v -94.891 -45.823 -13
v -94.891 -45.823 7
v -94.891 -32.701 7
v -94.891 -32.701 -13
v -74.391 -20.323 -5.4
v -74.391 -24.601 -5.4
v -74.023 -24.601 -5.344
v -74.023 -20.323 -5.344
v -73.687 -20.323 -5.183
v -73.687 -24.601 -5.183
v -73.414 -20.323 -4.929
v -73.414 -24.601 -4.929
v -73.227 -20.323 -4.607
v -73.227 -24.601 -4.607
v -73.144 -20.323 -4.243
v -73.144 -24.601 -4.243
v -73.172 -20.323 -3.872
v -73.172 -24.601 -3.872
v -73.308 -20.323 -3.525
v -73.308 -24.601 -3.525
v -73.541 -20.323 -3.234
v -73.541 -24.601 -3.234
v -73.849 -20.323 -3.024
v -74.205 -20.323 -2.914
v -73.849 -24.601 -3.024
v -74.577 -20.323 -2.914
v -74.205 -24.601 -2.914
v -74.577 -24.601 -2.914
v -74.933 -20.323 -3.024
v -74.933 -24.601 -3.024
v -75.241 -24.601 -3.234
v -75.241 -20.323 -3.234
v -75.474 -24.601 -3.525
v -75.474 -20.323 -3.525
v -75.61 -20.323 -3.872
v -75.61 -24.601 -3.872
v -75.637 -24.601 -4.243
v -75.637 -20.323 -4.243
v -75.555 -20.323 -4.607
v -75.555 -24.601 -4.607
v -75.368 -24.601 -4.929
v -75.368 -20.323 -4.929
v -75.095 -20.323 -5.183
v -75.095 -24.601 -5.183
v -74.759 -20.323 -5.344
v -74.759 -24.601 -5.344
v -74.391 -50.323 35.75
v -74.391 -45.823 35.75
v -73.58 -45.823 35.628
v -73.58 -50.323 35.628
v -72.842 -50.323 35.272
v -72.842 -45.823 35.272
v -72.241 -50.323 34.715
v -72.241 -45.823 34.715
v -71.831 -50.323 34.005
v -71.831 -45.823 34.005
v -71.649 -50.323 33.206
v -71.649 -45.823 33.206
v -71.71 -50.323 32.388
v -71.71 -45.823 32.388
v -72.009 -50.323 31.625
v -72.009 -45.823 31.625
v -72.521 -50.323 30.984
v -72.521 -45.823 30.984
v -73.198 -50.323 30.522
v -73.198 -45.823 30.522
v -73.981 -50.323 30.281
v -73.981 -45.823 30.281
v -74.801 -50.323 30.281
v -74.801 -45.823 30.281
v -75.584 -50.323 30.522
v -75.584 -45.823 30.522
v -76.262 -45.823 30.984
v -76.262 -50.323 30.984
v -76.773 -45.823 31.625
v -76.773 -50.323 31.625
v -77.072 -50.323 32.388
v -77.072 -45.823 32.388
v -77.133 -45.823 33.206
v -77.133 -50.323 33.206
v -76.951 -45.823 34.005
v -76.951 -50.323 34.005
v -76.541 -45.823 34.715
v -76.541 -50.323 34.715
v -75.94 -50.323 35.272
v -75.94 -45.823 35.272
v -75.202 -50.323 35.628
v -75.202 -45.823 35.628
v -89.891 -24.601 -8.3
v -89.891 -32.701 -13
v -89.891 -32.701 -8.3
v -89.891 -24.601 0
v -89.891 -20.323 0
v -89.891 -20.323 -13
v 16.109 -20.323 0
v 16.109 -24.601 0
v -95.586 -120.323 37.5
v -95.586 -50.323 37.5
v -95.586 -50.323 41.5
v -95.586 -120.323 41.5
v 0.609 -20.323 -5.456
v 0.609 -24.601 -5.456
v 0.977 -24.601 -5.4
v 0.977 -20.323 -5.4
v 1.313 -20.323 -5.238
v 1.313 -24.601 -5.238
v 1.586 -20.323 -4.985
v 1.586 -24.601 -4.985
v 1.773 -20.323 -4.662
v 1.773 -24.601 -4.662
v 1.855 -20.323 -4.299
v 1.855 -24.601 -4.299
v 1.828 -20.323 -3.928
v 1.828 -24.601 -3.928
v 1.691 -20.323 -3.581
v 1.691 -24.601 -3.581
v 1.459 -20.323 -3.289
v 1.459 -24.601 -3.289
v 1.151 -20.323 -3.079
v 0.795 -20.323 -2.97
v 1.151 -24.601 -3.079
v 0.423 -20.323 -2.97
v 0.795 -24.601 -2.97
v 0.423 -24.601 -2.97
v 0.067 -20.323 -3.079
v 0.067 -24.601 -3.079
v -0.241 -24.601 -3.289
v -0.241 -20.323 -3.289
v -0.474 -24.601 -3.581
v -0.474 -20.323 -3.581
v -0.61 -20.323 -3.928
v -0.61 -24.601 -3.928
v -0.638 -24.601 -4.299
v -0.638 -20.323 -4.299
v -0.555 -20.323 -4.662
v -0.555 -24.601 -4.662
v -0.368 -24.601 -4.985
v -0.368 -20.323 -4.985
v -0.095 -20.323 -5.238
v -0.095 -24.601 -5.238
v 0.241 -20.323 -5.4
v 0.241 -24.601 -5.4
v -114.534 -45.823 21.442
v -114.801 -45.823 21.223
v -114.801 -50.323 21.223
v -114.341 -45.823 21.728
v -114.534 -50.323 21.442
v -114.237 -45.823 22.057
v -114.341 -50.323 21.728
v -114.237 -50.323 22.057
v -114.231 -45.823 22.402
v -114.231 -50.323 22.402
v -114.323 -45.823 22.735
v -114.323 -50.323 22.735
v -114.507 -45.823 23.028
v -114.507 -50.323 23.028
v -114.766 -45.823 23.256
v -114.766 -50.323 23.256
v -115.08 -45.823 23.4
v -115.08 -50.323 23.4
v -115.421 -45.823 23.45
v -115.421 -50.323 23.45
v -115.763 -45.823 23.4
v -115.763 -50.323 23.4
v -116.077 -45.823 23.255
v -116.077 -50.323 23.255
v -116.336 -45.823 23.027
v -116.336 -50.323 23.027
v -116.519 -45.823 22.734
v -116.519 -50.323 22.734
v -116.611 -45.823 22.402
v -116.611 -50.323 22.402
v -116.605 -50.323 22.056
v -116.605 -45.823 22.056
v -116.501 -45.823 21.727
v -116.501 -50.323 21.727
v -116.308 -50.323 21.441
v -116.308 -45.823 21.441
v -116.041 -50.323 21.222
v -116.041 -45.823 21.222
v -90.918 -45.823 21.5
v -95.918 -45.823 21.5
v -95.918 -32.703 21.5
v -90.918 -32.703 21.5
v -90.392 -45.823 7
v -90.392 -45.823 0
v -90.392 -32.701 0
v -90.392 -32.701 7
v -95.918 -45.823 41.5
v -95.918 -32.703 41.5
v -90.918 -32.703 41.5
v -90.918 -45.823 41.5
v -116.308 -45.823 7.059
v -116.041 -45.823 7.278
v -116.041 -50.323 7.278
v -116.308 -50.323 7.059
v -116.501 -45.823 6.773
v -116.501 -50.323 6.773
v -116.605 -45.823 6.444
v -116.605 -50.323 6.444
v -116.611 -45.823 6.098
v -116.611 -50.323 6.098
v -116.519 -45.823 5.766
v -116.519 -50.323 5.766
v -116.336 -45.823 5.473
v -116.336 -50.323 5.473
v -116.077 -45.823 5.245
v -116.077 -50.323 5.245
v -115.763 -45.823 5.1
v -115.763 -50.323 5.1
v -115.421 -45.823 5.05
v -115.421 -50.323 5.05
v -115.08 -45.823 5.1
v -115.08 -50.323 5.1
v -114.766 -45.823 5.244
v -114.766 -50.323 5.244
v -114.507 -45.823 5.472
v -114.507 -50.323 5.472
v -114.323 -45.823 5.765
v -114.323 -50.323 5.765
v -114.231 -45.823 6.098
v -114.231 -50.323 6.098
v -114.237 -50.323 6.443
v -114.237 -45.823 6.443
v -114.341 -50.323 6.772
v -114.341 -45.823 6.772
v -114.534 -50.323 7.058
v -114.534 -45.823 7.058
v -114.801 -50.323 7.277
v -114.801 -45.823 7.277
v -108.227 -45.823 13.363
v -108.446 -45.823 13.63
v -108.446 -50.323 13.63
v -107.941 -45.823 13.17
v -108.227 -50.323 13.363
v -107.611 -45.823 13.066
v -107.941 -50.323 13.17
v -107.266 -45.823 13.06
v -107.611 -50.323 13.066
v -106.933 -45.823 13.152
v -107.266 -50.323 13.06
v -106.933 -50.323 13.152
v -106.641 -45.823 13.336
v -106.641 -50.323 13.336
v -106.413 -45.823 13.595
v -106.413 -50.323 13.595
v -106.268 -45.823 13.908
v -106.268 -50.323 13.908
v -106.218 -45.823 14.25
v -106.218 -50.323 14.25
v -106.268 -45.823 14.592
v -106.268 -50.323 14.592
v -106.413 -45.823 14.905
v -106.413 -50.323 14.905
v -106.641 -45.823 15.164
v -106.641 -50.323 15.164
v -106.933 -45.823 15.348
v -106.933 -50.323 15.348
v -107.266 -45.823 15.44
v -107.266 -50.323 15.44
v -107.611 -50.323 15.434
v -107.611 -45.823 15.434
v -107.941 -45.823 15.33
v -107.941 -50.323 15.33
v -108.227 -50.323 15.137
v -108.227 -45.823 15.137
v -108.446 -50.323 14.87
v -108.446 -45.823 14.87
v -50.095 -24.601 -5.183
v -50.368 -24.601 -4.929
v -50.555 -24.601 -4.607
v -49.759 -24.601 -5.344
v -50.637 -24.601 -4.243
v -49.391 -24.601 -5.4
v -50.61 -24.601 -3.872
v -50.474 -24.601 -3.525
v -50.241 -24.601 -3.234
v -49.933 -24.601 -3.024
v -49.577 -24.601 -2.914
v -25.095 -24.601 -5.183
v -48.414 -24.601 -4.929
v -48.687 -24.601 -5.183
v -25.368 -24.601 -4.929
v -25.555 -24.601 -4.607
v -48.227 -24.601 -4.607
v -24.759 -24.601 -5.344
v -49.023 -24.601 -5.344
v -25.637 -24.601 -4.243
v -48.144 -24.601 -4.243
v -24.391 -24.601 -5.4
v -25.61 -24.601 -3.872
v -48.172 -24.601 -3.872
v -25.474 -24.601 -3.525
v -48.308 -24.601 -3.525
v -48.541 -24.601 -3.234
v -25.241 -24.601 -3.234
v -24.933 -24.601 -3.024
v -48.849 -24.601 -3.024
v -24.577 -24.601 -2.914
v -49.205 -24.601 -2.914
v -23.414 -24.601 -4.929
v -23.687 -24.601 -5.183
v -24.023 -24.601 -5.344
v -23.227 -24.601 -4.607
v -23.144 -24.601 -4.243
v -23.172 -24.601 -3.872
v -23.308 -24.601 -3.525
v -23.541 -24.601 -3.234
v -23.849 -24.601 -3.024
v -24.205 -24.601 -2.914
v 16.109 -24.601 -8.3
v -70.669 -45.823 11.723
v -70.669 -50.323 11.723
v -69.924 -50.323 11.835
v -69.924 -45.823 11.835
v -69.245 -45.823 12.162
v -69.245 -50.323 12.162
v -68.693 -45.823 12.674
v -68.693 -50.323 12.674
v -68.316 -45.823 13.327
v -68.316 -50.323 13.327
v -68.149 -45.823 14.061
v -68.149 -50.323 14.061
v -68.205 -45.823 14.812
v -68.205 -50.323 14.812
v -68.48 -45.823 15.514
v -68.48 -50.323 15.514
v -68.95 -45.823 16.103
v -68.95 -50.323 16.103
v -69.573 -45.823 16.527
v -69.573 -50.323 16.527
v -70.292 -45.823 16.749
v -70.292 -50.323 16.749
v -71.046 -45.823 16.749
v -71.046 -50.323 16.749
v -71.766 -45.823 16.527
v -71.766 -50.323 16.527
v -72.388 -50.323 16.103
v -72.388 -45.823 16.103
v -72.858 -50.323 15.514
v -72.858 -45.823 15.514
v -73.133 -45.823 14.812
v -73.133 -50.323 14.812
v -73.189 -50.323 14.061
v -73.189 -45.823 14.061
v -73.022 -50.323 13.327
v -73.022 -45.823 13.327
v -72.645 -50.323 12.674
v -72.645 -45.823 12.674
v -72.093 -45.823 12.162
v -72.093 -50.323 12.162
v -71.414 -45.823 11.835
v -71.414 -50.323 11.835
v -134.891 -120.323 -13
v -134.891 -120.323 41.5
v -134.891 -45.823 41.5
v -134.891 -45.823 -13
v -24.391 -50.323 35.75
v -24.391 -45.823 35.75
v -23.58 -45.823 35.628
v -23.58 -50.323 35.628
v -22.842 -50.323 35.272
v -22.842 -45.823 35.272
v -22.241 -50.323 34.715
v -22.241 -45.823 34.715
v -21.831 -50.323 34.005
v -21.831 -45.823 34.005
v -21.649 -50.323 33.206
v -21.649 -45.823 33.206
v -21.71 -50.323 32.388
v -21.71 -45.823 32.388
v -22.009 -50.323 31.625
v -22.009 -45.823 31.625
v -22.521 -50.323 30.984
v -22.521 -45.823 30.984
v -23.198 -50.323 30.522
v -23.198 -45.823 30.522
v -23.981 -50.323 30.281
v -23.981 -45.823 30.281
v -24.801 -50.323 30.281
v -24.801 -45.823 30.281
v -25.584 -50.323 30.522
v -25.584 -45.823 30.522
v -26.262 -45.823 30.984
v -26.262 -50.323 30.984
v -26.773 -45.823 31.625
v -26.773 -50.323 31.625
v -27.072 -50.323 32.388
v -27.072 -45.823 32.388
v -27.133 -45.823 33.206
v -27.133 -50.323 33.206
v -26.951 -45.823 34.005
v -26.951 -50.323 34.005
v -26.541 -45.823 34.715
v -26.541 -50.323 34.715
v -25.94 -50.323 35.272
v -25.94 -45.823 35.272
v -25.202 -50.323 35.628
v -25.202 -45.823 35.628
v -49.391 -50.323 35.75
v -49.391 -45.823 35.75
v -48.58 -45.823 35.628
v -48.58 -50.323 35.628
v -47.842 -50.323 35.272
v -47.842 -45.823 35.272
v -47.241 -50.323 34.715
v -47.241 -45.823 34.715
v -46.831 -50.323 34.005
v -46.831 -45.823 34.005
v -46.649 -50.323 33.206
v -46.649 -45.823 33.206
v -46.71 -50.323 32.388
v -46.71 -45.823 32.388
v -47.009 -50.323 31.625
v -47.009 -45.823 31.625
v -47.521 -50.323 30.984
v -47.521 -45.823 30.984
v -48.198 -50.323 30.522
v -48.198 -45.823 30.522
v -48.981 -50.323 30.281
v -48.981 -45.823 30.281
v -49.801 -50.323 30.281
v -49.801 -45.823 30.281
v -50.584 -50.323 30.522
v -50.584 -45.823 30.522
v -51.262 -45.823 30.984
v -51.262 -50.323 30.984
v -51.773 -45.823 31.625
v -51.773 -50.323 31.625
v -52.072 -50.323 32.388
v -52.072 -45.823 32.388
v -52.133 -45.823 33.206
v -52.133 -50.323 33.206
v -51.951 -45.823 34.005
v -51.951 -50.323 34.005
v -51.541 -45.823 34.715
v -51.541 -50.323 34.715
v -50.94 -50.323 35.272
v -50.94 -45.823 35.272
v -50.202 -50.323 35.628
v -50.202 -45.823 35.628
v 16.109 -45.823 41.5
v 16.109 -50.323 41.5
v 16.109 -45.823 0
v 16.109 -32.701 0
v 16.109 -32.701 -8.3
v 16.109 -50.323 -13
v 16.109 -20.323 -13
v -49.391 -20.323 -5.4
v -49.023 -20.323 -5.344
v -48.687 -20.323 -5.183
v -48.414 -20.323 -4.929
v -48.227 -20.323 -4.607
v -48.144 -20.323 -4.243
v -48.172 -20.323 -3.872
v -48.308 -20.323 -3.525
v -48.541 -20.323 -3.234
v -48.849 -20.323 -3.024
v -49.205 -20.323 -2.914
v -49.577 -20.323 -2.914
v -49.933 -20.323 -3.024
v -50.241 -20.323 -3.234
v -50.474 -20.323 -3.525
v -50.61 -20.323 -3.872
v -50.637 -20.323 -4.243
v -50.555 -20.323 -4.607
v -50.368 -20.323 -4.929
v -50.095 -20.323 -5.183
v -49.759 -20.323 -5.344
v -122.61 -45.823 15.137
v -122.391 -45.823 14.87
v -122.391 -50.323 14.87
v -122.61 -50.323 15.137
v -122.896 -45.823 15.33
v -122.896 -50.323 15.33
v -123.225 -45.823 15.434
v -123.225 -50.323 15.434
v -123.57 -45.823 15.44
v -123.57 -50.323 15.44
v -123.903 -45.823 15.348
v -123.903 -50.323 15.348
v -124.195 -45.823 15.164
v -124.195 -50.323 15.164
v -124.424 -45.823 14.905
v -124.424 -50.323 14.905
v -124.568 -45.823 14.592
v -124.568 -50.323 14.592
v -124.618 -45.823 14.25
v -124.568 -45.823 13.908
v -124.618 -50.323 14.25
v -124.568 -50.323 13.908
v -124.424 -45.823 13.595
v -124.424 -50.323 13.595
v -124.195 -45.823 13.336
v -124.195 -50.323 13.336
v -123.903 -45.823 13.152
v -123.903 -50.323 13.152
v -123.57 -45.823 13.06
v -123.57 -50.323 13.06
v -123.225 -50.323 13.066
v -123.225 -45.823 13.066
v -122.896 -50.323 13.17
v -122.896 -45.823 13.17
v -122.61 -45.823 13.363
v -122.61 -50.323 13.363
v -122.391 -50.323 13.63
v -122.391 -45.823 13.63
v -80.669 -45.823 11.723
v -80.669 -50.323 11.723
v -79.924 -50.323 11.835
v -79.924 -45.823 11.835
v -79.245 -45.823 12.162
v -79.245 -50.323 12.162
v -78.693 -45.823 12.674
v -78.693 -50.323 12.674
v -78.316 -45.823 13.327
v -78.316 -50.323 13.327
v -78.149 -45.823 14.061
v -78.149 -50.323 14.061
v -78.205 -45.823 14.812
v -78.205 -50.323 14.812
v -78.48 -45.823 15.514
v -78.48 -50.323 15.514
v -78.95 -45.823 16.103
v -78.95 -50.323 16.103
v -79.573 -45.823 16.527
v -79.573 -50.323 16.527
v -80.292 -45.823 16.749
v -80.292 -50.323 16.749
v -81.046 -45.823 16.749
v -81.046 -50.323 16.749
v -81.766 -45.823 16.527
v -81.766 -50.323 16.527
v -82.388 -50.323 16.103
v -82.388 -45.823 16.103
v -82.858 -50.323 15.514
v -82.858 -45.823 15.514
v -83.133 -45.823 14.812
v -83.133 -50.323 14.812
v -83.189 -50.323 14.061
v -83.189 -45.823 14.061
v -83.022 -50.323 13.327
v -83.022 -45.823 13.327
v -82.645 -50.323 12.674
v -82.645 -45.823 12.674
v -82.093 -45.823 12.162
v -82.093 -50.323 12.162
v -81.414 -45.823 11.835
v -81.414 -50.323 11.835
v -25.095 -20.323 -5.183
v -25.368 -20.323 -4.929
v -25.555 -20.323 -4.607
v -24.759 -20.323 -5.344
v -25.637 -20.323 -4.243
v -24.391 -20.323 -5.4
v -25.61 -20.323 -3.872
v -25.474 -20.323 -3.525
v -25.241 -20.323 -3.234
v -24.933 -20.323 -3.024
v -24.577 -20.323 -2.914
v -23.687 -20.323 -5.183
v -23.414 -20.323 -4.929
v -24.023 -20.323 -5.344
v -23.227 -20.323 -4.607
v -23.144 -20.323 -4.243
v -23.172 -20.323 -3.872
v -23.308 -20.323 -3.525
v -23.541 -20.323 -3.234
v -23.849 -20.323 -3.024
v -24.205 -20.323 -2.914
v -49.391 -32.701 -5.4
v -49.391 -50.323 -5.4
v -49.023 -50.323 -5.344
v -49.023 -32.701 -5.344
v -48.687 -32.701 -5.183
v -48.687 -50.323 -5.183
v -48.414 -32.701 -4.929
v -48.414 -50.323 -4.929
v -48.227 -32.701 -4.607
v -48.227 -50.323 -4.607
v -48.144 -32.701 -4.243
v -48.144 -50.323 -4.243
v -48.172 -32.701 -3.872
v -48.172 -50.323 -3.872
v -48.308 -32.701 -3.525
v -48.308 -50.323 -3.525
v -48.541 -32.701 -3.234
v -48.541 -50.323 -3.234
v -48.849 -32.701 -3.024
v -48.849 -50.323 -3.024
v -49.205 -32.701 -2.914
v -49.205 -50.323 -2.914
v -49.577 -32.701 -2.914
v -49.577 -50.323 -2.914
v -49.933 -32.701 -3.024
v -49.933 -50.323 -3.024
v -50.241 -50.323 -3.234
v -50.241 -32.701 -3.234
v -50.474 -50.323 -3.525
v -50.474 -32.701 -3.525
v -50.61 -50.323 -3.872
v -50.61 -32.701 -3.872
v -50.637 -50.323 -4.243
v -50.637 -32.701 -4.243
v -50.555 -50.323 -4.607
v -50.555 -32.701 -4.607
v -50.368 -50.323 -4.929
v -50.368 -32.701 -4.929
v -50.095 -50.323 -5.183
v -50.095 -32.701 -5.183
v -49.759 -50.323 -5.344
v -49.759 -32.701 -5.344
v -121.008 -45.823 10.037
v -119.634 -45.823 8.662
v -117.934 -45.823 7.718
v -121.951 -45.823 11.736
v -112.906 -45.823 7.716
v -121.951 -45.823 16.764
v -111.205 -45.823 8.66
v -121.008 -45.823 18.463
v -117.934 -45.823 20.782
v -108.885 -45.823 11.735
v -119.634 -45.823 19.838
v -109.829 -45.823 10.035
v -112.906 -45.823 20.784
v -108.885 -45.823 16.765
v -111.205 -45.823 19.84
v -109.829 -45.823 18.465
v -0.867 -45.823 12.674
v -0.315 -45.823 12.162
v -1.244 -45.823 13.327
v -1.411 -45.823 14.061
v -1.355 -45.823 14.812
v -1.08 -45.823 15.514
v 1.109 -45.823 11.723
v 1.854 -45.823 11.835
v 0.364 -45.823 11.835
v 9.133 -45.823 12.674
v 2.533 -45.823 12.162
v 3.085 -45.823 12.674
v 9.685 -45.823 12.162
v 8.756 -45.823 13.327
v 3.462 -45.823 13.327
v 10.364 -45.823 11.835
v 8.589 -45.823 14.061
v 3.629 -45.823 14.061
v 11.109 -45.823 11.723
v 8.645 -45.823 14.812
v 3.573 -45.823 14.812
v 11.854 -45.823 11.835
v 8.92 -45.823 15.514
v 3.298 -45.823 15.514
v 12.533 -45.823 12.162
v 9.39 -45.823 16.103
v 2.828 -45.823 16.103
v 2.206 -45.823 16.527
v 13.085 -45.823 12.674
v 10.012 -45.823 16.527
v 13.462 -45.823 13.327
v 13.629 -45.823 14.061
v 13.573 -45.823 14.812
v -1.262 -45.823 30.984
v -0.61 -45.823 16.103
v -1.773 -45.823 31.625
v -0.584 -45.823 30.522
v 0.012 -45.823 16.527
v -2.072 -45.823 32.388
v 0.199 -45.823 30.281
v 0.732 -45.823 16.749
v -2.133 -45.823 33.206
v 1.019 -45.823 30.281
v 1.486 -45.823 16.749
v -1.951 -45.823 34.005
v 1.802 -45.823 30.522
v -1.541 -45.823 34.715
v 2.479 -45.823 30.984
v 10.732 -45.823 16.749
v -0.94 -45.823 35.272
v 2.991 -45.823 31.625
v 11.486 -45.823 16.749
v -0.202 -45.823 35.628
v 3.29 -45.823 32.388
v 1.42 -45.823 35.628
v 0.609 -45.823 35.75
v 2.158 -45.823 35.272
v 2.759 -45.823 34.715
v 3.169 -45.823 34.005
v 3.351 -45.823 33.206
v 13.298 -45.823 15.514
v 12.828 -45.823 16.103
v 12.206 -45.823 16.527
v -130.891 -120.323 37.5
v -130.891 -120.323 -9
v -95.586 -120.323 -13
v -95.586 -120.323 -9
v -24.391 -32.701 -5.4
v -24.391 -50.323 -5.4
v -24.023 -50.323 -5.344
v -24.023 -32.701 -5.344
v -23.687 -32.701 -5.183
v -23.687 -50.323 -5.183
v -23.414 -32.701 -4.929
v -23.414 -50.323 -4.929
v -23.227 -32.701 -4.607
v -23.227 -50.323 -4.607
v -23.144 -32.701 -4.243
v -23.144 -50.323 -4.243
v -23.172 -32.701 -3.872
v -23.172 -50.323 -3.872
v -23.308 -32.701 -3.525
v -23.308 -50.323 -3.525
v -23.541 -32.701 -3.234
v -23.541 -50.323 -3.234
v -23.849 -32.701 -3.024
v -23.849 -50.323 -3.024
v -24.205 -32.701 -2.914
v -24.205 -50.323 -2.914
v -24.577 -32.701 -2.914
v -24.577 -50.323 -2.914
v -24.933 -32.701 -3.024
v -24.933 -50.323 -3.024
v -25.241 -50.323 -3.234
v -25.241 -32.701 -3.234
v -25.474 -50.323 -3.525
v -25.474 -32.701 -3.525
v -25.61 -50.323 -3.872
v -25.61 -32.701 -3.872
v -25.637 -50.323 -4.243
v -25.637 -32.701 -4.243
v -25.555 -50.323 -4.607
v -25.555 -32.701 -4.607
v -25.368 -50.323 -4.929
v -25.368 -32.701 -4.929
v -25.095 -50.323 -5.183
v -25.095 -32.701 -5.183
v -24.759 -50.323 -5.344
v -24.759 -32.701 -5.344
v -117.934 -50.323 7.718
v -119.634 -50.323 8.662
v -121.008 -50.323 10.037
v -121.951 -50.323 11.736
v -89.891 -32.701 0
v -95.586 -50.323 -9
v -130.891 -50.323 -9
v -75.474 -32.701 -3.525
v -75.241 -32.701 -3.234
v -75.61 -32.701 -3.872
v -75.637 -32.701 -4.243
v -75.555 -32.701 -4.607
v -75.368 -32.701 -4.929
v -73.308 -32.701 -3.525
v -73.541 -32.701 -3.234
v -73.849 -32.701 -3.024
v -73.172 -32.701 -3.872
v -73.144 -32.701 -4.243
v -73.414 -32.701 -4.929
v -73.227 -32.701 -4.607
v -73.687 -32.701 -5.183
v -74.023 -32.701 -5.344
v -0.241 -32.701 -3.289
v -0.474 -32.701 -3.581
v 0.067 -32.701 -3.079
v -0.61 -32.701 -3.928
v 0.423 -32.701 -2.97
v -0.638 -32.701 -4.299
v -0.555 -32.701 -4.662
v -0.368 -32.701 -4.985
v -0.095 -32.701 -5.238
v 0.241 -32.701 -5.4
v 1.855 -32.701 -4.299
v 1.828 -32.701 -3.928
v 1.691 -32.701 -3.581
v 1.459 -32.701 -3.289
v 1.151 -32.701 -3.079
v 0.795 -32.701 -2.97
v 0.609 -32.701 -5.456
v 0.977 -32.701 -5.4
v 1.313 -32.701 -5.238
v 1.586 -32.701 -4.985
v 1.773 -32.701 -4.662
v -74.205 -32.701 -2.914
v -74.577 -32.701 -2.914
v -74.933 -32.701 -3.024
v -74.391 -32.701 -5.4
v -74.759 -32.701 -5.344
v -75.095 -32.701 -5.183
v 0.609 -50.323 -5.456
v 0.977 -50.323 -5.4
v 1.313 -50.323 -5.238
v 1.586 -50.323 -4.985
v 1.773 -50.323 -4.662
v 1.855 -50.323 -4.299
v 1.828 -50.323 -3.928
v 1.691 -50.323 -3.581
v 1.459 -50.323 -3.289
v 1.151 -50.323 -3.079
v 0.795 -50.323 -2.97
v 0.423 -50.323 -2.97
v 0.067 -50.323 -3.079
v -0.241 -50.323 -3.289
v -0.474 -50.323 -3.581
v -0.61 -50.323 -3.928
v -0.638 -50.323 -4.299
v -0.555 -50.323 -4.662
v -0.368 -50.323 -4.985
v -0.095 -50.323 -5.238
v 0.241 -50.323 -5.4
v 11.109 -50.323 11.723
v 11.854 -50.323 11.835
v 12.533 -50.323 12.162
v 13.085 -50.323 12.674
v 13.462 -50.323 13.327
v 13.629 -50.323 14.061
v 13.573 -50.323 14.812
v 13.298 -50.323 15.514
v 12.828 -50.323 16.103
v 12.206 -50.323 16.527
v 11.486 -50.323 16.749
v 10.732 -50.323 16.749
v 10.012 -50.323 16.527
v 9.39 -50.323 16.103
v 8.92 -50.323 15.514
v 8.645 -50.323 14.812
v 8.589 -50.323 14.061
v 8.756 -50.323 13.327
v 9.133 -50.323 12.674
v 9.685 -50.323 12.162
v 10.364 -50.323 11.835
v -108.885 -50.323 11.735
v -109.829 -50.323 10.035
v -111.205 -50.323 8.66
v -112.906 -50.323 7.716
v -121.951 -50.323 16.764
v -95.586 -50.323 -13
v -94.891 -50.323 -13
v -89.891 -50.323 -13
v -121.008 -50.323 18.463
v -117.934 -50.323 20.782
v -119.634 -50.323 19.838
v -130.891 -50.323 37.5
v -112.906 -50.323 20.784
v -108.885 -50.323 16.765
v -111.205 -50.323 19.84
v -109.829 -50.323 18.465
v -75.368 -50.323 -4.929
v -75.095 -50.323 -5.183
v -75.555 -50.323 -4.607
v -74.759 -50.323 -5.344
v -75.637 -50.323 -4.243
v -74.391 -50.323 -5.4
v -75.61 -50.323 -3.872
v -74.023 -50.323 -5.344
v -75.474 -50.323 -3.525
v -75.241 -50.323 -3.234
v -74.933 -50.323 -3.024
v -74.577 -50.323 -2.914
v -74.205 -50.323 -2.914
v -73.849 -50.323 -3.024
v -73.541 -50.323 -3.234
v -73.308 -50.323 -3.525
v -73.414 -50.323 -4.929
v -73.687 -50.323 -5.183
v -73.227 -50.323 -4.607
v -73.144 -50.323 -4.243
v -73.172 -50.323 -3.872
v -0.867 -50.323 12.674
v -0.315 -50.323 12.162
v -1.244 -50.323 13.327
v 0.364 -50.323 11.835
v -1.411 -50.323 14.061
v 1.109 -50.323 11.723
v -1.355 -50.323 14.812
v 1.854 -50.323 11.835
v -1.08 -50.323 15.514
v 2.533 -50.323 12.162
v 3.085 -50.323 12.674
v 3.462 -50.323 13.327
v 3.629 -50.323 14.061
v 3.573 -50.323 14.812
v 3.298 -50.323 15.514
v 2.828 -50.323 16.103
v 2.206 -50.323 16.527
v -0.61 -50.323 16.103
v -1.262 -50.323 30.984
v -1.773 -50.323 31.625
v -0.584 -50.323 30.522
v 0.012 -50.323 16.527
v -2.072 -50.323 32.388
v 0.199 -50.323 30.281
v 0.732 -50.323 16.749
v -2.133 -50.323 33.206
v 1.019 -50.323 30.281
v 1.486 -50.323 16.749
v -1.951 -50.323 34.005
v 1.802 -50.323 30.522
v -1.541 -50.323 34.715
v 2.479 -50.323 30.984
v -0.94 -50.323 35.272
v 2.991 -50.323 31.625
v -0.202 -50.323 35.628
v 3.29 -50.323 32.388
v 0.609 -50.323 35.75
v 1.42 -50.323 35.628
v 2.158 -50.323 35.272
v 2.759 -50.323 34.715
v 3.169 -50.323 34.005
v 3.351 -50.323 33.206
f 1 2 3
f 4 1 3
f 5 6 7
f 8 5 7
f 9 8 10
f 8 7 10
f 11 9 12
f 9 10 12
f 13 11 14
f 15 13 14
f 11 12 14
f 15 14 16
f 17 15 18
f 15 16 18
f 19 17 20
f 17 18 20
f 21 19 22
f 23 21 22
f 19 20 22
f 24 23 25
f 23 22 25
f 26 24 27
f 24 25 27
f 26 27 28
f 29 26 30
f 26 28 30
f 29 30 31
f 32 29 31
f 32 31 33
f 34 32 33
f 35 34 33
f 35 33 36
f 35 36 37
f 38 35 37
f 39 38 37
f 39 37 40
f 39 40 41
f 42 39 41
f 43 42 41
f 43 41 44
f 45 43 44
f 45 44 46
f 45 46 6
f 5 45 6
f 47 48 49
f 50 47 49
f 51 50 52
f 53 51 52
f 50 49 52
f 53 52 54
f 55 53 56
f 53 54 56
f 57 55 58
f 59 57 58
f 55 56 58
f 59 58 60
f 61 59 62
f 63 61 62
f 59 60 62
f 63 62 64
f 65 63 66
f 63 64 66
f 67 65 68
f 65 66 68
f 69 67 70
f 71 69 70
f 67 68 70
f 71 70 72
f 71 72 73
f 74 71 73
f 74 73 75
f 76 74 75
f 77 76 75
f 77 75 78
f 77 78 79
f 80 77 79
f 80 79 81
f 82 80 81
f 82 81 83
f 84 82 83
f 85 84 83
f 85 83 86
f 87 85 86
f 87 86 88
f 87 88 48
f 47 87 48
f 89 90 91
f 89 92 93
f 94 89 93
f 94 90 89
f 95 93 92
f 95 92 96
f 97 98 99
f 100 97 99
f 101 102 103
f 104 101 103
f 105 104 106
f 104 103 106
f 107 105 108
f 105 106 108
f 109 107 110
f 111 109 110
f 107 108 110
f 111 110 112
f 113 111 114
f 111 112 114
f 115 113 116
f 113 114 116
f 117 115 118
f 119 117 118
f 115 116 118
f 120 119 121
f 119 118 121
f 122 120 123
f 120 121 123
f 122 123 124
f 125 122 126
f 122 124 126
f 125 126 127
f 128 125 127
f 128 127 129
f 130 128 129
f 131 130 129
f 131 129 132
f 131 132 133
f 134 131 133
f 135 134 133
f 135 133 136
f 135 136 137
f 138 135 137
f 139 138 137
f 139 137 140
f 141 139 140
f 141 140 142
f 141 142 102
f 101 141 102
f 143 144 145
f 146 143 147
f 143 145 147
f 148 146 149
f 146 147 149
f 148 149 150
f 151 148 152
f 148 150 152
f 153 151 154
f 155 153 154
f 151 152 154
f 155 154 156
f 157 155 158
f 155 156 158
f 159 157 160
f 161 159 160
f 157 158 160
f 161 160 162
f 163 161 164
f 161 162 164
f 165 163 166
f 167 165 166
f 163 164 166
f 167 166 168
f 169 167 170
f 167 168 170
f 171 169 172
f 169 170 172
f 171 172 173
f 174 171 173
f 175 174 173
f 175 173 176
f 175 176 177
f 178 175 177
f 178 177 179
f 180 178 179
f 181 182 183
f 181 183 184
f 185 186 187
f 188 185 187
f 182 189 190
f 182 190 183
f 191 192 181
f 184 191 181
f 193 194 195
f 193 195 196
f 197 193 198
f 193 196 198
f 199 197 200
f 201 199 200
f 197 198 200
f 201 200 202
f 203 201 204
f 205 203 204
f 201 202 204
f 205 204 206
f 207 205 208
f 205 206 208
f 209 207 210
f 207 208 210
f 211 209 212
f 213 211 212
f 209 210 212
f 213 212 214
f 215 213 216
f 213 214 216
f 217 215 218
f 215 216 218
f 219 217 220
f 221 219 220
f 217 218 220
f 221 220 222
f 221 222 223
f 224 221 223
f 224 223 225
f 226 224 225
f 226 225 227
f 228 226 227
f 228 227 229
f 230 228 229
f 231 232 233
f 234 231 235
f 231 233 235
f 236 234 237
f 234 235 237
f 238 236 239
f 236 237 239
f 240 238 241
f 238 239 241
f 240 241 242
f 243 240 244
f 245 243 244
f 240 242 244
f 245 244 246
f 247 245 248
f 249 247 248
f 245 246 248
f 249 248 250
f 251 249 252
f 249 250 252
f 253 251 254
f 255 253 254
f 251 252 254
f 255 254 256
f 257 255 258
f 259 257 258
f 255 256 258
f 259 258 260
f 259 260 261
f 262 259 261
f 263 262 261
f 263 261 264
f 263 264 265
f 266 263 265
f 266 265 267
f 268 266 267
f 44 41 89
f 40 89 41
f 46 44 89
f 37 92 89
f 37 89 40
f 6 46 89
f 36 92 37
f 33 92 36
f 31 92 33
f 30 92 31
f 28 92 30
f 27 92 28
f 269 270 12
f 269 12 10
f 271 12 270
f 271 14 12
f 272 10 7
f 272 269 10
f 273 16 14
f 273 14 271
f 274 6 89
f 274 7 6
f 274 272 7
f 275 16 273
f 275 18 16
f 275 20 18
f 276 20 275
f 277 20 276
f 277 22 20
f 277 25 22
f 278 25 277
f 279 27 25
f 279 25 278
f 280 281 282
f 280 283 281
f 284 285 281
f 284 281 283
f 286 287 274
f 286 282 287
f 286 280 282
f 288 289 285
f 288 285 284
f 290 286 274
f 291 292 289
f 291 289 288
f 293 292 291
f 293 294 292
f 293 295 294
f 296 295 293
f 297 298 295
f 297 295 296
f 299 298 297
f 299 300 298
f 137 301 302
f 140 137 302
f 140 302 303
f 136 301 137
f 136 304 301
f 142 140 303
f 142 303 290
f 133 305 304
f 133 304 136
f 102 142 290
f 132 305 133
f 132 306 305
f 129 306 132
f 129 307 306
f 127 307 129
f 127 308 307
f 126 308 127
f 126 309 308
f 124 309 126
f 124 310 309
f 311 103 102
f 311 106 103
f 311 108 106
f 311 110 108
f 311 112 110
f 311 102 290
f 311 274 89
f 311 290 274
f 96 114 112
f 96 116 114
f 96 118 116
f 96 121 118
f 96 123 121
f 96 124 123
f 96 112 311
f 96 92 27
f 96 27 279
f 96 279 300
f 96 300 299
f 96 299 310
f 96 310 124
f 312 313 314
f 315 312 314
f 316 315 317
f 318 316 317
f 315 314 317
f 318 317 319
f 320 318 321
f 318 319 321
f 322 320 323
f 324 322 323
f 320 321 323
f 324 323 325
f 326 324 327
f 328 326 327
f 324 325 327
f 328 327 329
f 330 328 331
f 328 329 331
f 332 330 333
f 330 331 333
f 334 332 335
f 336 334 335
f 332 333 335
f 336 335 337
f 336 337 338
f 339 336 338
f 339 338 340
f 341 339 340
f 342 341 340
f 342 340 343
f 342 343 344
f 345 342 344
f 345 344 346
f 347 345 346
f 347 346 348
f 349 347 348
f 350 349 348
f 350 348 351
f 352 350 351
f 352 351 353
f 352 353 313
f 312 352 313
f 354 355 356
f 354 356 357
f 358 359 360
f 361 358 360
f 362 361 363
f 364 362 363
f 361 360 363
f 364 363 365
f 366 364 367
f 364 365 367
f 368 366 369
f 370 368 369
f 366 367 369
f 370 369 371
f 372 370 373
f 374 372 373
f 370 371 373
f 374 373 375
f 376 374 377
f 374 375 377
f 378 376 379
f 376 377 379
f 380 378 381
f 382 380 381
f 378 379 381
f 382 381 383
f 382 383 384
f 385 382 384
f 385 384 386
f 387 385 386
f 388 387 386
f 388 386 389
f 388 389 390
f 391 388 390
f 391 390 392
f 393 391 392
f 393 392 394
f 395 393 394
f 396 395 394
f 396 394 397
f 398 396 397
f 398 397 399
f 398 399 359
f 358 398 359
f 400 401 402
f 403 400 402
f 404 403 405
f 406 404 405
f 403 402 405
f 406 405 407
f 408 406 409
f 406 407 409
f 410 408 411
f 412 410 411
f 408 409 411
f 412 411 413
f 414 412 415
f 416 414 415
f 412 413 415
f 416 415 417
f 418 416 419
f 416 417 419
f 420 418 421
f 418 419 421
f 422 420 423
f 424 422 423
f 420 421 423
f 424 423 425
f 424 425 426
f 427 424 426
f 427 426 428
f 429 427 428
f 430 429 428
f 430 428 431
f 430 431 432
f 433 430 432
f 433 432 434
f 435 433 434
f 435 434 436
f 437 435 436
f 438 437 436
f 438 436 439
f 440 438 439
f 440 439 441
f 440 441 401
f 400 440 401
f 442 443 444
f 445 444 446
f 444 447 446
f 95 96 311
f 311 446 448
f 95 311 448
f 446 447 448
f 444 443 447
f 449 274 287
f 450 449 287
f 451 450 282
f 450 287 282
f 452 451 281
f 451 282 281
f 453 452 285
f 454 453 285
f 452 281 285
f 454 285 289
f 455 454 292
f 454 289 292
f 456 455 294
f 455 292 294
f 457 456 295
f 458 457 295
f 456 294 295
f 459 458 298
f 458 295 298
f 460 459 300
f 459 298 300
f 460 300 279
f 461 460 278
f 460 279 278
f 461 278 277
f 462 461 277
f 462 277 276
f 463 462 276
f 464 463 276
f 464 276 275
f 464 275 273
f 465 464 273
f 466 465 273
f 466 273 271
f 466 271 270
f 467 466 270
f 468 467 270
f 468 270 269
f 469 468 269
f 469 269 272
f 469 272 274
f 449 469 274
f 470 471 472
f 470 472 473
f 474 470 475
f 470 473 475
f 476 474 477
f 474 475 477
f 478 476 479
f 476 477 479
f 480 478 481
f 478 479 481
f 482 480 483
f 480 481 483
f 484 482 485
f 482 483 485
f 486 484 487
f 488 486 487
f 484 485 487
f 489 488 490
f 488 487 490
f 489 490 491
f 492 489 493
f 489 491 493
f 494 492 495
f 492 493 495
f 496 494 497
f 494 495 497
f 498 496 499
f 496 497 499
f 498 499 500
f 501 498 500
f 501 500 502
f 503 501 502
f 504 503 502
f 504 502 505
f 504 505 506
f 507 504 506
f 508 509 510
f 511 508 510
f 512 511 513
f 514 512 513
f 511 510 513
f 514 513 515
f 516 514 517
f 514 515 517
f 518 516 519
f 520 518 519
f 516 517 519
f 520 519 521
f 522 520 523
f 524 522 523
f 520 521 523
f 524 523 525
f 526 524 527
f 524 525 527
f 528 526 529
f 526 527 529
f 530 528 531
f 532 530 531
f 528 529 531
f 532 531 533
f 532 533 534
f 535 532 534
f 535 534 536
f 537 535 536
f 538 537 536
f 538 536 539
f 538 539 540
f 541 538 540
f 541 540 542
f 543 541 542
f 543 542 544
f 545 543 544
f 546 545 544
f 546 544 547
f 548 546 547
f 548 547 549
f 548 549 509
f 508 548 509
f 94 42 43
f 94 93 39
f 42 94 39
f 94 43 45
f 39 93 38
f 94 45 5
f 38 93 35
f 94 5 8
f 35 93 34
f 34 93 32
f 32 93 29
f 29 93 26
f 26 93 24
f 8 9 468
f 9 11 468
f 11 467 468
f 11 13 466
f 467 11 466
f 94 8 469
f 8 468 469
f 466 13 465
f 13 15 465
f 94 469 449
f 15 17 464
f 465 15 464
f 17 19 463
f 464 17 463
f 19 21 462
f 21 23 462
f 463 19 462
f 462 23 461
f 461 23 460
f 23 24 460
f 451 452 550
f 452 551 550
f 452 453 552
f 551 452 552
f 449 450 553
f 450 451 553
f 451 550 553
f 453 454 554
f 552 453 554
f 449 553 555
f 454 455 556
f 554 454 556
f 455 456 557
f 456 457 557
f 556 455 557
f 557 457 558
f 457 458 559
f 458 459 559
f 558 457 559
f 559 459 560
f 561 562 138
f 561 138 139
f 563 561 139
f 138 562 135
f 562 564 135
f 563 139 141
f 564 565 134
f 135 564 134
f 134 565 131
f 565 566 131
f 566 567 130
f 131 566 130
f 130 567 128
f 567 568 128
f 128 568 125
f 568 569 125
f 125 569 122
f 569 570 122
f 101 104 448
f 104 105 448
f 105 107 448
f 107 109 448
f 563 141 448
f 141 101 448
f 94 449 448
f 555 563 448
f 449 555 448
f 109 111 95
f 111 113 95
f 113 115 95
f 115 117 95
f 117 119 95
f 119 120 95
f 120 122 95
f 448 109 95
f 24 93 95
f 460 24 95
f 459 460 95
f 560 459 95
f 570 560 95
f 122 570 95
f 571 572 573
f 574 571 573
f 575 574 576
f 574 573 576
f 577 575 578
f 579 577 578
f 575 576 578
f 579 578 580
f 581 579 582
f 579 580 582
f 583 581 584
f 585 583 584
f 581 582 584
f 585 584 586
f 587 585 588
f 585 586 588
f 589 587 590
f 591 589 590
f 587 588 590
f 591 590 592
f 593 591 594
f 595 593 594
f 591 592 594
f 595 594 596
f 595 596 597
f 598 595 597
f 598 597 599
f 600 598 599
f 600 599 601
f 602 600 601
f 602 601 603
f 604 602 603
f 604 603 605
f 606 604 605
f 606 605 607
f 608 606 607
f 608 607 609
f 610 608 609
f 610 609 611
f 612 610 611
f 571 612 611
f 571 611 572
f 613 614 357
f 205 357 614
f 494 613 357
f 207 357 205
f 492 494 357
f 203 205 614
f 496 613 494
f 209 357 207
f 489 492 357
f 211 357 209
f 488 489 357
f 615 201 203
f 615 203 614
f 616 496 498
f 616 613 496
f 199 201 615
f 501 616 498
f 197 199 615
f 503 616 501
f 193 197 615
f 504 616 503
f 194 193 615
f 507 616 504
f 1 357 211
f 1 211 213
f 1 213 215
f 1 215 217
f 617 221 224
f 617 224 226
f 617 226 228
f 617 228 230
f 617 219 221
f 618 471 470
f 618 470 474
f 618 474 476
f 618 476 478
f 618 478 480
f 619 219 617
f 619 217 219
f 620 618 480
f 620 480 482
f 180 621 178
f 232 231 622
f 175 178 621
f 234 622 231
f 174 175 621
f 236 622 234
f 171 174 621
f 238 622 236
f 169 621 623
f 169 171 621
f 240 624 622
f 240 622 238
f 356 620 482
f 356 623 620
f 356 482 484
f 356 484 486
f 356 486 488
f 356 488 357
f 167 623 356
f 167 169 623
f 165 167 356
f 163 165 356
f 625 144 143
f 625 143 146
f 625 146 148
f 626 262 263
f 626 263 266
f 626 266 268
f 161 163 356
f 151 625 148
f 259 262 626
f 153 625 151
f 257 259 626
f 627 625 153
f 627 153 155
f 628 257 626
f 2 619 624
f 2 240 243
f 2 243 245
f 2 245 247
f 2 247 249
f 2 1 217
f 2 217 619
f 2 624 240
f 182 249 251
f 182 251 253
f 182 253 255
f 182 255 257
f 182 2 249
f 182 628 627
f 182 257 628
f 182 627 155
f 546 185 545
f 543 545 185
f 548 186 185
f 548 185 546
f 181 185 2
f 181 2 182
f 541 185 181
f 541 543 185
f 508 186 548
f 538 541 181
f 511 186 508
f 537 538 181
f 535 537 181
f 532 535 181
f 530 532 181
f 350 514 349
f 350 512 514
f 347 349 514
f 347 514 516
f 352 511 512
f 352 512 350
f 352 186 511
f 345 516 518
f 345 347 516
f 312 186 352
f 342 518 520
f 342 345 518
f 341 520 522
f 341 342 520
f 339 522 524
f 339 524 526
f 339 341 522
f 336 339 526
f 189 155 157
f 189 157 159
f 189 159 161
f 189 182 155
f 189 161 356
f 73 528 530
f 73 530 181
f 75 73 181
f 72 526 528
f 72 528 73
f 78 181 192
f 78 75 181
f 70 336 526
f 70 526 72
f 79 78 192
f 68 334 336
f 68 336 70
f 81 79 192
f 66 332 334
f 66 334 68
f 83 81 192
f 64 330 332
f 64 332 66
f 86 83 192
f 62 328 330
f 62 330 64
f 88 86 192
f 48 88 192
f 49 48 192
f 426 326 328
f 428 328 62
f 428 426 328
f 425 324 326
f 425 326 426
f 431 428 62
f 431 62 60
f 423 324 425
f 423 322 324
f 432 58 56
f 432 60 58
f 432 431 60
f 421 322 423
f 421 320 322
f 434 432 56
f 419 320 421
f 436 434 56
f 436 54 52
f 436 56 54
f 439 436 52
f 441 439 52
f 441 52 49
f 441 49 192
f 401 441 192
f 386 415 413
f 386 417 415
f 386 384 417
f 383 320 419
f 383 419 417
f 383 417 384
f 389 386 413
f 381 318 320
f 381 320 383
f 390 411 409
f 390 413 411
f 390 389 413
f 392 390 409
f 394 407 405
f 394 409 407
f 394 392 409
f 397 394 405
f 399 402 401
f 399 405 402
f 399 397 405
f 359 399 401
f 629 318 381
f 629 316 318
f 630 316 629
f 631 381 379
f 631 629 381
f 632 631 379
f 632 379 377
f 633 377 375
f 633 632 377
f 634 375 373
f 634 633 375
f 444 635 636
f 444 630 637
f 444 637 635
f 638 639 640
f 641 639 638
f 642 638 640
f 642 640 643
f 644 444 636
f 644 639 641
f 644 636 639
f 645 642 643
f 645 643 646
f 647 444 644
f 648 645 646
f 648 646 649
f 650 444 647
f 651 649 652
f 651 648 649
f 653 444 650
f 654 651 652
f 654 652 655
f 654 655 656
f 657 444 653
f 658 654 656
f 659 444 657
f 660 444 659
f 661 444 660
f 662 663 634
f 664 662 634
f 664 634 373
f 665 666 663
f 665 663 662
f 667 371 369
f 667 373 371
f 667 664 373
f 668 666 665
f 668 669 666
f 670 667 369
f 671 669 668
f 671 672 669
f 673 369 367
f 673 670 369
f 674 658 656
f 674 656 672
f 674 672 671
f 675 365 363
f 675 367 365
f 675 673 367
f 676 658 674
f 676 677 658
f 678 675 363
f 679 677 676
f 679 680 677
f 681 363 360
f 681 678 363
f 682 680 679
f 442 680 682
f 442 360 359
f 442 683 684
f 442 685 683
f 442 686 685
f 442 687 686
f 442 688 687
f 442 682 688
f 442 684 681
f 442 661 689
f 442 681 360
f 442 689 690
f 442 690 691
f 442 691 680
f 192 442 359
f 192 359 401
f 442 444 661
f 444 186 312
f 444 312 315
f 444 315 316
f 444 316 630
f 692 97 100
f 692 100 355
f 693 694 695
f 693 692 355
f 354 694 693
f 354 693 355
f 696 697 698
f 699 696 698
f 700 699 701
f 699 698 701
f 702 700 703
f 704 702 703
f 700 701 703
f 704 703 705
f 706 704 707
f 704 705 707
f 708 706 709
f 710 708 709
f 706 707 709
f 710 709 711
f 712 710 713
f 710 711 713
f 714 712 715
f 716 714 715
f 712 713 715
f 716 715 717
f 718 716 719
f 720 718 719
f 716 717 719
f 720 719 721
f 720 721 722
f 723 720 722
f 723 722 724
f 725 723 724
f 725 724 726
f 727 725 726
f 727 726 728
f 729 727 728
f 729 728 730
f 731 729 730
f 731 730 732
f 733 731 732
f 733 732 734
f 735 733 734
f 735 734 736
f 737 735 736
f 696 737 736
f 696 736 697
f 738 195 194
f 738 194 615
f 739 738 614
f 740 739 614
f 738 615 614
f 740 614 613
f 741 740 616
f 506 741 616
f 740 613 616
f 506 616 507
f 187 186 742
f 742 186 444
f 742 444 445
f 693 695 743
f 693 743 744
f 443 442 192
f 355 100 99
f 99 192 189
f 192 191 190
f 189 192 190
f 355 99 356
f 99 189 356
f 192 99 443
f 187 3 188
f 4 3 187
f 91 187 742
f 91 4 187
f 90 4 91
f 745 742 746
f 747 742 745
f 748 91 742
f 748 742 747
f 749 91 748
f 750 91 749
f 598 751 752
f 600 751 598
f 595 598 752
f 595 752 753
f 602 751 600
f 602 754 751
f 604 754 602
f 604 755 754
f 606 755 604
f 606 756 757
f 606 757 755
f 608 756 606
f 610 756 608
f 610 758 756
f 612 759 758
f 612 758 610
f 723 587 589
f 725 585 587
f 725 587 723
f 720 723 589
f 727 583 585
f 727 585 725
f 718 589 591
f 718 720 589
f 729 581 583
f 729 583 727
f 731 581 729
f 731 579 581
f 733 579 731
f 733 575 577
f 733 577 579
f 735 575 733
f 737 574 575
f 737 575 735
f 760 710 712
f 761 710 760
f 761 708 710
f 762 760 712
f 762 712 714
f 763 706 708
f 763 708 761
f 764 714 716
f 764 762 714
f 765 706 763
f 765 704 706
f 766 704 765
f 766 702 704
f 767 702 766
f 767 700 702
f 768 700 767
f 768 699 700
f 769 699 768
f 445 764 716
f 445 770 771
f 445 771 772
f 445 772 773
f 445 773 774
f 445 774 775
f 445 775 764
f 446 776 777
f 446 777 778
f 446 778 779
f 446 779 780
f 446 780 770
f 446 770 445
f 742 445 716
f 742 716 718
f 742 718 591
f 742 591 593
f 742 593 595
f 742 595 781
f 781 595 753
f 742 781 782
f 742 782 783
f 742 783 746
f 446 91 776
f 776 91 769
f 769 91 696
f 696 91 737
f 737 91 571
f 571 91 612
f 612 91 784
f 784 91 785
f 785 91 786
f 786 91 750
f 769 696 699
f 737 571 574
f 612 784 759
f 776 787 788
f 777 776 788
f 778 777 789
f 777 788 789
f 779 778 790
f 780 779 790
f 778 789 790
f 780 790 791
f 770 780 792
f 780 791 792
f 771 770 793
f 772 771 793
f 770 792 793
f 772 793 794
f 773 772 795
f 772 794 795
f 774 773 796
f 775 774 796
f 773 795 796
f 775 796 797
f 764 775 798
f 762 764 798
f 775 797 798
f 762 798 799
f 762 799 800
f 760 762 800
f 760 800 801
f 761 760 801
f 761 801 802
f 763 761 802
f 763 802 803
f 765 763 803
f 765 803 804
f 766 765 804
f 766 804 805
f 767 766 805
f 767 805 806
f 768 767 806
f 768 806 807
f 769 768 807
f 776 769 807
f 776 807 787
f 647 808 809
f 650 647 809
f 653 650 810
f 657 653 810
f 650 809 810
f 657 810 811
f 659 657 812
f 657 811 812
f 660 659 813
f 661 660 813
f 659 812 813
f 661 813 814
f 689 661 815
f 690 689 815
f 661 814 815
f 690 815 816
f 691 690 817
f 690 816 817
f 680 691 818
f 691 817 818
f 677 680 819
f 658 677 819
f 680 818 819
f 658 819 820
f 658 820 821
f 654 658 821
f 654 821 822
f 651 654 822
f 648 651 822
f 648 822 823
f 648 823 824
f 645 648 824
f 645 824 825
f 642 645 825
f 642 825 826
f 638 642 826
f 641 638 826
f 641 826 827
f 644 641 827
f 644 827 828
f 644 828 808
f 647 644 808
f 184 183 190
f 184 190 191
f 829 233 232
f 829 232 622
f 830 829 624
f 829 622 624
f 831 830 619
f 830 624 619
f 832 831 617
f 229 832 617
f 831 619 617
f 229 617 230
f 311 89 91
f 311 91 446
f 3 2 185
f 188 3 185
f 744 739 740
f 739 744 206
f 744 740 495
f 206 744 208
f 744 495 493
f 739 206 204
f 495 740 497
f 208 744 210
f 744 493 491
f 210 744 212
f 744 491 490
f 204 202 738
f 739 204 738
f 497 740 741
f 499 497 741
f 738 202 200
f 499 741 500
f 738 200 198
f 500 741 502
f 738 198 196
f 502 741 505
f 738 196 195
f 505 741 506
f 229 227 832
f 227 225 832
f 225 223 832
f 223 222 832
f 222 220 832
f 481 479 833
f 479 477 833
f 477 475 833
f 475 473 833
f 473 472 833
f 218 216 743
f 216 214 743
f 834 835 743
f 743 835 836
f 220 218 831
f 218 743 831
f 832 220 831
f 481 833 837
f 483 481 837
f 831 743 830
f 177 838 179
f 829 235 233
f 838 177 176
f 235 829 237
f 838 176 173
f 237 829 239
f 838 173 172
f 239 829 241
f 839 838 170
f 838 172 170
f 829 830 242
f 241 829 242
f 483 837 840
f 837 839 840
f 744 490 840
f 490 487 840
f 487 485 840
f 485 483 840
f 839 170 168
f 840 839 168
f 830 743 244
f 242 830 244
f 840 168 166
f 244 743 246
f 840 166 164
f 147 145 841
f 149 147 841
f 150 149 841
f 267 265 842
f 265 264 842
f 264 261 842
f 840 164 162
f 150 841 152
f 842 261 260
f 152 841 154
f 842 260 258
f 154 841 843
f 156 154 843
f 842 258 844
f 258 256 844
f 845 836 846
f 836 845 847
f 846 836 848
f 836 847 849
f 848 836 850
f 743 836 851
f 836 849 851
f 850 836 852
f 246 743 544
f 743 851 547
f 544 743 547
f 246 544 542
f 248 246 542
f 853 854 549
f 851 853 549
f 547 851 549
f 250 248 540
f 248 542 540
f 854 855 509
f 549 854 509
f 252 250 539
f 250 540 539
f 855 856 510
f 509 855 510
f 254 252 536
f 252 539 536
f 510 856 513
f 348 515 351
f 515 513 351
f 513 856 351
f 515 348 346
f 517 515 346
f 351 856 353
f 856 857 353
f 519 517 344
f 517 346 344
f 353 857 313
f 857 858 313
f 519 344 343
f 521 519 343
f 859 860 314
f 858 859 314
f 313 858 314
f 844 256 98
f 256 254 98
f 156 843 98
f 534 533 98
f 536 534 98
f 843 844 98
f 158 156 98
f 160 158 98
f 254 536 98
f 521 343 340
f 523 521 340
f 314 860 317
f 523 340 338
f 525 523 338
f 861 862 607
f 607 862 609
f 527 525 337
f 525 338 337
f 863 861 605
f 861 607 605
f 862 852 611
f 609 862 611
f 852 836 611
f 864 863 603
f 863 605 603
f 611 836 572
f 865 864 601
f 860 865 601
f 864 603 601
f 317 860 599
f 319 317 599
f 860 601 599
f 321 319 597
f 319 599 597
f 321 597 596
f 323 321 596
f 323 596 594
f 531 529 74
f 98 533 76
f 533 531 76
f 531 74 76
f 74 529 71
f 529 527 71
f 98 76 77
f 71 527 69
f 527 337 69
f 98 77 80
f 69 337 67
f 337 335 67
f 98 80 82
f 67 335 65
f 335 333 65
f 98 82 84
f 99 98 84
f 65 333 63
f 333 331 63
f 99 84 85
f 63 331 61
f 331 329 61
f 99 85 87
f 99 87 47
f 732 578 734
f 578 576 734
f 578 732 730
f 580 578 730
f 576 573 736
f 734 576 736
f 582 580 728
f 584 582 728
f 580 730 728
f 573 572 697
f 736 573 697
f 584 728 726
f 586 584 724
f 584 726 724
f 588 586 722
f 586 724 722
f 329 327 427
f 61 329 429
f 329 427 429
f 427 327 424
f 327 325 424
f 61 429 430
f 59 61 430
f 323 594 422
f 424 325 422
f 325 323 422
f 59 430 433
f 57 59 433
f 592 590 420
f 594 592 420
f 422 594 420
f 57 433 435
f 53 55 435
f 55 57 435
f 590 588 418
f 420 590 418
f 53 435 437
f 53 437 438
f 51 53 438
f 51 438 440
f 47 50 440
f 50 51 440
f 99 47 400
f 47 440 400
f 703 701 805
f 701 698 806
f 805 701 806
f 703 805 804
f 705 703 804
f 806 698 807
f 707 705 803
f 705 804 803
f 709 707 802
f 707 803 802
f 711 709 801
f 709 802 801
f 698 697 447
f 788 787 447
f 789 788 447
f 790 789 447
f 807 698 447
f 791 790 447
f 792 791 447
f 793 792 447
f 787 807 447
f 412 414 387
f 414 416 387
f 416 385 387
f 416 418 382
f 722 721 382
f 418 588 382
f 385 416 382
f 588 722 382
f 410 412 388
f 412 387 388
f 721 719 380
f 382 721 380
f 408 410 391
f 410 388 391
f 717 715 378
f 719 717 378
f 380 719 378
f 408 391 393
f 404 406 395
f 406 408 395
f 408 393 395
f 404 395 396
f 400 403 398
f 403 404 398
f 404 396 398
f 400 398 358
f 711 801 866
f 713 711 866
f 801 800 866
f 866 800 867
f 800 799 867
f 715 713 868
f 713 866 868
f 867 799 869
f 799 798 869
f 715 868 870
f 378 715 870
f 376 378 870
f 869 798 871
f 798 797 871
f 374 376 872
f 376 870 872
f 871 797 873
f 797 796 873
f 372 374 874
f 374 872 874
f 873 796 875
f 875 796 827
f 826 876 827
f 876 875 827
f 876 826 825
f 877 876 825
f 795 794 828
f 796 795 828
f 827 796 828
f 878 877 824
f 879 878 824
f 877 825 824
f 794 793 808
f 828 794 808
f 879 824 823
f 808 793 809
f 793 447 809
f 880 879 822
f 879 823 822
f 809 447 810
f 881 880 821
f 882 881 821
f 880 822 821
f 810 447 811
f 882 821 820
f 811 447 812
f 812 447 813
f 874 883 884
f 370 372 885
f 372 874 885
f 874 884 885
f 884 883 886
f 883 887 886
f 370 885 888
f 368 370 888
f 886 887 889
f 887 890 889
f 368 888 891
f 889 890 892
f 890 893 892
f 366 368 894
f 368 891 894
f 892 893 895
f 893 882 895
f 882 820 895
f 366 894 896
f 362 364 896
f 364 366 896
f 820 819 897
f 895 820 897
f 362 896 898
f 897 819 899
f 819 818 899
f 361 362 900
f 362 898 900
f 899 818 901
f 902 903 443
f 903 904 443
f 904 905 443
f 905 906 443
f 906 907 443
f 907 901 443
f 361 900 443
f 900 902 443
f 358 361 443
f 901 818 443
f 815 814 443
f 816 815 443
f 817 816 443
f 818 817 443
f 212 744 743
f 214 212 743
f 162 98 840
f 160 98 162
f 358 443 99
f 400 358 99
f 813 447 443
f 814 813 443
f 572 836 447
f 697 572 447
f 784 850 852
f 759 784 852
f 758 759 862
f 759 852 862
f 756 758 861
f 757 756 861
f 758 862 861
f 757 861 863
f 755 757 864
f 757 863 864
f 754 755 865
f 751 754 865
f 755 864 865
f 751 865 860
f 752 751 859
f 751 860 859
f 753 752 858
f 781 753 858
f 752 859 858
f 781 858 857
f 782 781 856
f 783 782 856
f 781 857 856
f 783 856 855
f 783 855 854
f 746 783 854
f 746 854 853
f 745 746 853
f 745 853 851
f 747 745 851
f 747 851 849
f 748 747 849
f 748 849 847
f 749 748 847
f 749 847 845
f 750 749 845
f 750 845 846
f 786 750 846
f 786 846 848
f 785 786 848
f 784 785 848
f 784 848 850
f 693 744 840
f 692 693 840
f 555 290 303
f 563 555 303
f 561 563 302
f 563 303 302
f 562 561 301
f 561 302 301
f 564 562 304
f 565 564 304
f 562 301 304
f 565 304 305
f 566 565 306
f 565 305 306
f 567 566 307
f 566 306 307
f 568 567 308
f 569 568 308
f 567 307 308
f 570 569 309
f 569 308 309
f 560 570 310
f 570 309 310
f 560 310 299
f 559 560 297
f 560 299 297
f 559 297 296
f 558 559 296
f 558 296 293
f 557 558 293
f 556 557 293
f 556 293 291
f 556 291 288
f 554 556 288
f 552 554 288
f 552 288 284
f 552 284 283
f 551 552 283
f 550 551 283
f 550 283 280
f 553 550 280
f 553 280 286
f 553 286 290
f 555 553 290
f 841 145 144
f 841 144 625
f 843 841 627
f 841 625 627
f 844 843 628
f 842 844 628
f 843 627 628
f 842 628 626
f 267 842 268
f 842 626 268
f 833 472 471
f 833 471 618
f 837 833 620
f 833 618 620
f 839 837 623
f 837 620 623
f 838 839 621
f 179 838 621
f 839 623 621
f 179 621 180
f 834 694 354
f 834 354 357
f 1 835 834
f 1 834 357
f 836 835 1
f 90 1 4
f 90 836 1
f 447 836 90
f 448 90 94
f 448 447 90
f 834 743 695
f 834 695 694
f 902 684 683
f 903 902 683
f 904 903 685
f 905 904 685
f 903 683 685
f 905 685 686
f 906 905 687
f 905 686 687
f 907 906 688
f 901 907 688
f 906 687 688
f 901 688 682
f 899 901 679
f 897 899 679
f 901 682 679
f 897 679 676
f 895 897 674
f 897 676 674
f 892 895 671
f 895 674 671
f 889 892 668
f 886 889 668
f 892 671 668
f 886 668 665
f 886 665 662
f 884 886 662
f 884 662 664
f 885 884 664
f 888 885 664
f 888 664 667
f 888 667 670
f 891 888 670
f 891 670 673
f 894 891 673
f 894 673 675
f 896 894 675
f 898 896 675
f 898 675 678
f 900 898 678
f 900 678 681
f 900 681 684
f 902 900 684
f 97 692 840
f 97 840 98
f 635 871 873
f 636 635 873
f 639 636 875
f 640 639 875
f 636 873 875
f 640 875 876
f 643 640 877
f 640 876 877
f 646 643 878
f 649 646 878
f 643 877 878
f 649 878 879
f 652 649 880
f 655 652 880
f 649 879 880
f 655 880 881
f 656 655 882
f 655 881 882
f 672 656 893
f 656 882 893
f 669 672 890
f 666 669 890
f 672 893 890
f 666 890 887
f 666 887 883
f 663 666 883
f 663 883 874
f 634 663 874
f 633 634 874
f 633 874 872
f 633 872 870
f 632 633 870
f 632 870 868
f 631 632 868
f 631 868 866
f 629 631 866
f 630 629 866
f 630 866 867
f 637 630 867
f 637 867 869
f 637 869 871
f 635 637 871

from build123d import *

# Parameters (mm, degrees)
SKETCH4_W                  = 106
SKETCH4_H                  = 30
BOSS_EXTRUDE2_DEPTH        = 13
SKETCH25_W                 = 106
SKETCH25_H                 = 8.1
CUT_EXTRUDE3_DEPTH         = 1
CUT_EXTRUDE3_DEPTH_BACK    = 8.3
M3X0_5_TAPPED_HOLE1_D      = 2.5
SKETCH28_W                 = 106
SKETCH28_H                 = 4.5
BOSS_EXTRUDE3_DEPTH        = 41.5
SKETCH32_W                 = 41.5
SKETCH32_H                 = 4.5
BOSS_EXTRUDE10_DEPTH       = 5
SKETCH33_W                 = 13
SKETCH33_H                 = 17.621445937
BOSS_EXTRUDE12_DEPTH       = 5
SKETCH34_W                 = 4.498886861
SKETCH34_H                 = 13.121445937
BOSS_EXTRUDE13_DEPTH       = 7
SKETCH35_W                 = 54.5
SKETCH35_H                 = 4.5
BOSS_EXTRUDE14_DEPTH       = 40
SKETCH36_W                 = 5
SKETCH36_H                 = 20
BOSS_EXTRUDE15_DEPTH       = 13.12
F_8_0_199_DIAMETER_HOLE1_D = 5.0546
SKETCH39_R                 = 7
CUT_EXTRUDE4_DEPTH         = 10
M2_CLEARANCE_HOLE1_D       = 2.4
M5_CLEARANCE_HOLE1_D       = 5.5
SKETCH43_W                 = 35.304815243
SKETCH43_H                 = 4
BOSS_EXTRUDE16_DEPTH       = 70


with BuildPart() as part:
    # Sketch4 → Boss-Extrude2 (new body)
    with BuildSketch(Plane.XY):
        with Locations((-36.891047602, -35.322762913)):
            Rectangle(SKETCH4_W, SKETCH4_H)
    extrude(amount=-BOSS_EXTRUDE2_DEPTH)

    # Sketch25 → Cut-Extrude3 (cut, two sides)
    with BuildSketch(Plane.XY) as cut_extrude3_sk:
        with Locations((-36.891047602, -28.651316976)):
            Rectangle(SKETCH25_W, SKETCH25_H)
    extrude(amount=CUT_EXTRUDE3_DEPTH, mode=Mode.SUBTRACT)
    extrude(cut_extrude3_sk.sketch, amount=-CUT_EXTRUDE3_DEPTH_BACK, mode=Mode.SUBTRACT)

    # M3x0.5 Tapped Hole1 (through all)
    with Locations(Plane(origin=(-74.390985602, -20.322762913, -4.15), x_dir=(0, 0, 1), z_dir=(0, 1, 0))):
        with Locations((0, 0), (0, 25), (-0.055677319, 74.999938), (0, 50)):
            Hole(M3X0_5_TAPPED_HOLE1_D / 2)

    # Sketch28 → Boss-Extrude3 (add)
    with BuildSketch(Plane.XY):
        with Locations((-36.891047602, -48.072762913)):
            Rectangle(SKETCH28_W, SKETCH28_H)
    extrude(amount=BOSS_EXTRUDE3_DEPTH)

    # Sketch32 → Boss-Extrude10 (add)
    with BuildSketch(Plane.ZY.offset(89.891047602)):
        with Locations((20.75, -48.072762913)):
            Rectangle(SKETCH32_W, SKETCH32_H)
    extrude(amount=BOSS_EXTRUDE10_DEPTH)

    # Sketch33 → Boss-Extrude12 (add)
    with BuildSketch(Plane.ZY.offset(89.891047602)):
        with Locations((-6.5, -41.512039945)):
            Rectangle(SKETCH33_W, SKETCH33_H)
    extrude(amount=BOSS_EXTRUDE12_DEPTH)

    # Sketch34 → Boss-Extrude13 (add)
    with BuildSketch(Plane.XY):
        with Locations((-92.641604172, -39.262039945)):
            Rectangle(SKETCH34_W, SKETCH34_H)
    extrude(amount=BOSS_EXTRUDE13_DEPTH)

    # Sketch35 → Boss-Extrude14 (add)
    with BuildSketch(Plane.ZY.offset(94.891047602)):
        with Locations((14.25, -48.072762913)):
            Rectangle(SKETCH35_W, SKETCH35_H)
    extrude(amount=BOSS_EXTRUDE14_DEPTH)

    # Sketch36 → Boss-Extrude15 (add)
    with BuildSketch(Plane(origin=(0, -45.822762913, 0), x_dir=(1, 0, 0), z_dir=(0, 1, 0))):
        with Locations((-93.41812931, -31.5)):
            Rectangle(SKETCH36_W, SKETCH36_H)
    extrude(amount=BOSS_EXTRUDE15_DEPTH)

    # #8 (0.199) Diameter Hole1 (through all)
    with Locations(Plane(origin=(-80.669073904, -45.822762913, 14.25), x_dir=(0, 0, 1), z_dir=(0, 1, 0))):
        with Locations((0, 0), (0, 91.778026302), (0, 81.778026302), (0, 10)):
            Hole(F_8_0_199_DIAMETER_HOLE1_D / 2)

    # Sketch39 → Cut-Extrude4 (cut)
    with BuildSketch(Plane(origin=(0, -45.822762913, 0), x_dir=(1, 0, 0), z_dir=(0, 1, 0))):
        with Locations((-115.41812931, -14.25)):
            Circle(SKETCH39_R)
    extrude(amount=-CUT_EXTRUDE4_DEPTH, mode=Mode.SUBTRACT)

    # M2 Clearance Hole1 (through all)
    with Locations(Plane(origin=(-107.41812931, -45.822762913, 14.25), x_dir=(0, 0, 1), z_dir=(0, 1, 0))):
        with Locations((0, 0), (8.000007036, -8.002918292), (-7.999992964, -8.002918292), (0, -16)):
            Hole(M2_CLEARANCE_HOLE1_D / 2)

    # M5 Clearance Hole1 (through all)
    with Locations(Plane(origin=(0.608952398, -50.322762913, 33), x_dir=(0, 0, -1), z_dir=(0, -1, 0))):
        with Locations((0, 0), (0, -25), (0, -50), (0, -75)):
            Hole(M5_CLEARANCE_HOLE1_D / 2)

    # Sketch43 → Boss-Extrude16 (add)
    with BuildSketch(Plane(origin=(0, -50.322762913, 0), x_dir=(-1, 0, 0), z_dir=(0, -1, 0))):
        Polygon((95.586232359, -37.5), (95.586232359, -41.5), (134.891047602, -41.5), (134.891047602, -37.5), (130.891047602, -37.5), align=None)
        Polygon((130.891047602, -37.5), (134.891047602, -37.5), (134.891047602, 13), (130.891047602, 13), (130.891047602, 9), align=None)
        with Locations((113.238639981, 11)):
            Rectangle(SKETCH43_W, SKETCH43_H)
    extrude(amount=BOSS_EXTRUDE16_DEPTH)


solid = part.part
